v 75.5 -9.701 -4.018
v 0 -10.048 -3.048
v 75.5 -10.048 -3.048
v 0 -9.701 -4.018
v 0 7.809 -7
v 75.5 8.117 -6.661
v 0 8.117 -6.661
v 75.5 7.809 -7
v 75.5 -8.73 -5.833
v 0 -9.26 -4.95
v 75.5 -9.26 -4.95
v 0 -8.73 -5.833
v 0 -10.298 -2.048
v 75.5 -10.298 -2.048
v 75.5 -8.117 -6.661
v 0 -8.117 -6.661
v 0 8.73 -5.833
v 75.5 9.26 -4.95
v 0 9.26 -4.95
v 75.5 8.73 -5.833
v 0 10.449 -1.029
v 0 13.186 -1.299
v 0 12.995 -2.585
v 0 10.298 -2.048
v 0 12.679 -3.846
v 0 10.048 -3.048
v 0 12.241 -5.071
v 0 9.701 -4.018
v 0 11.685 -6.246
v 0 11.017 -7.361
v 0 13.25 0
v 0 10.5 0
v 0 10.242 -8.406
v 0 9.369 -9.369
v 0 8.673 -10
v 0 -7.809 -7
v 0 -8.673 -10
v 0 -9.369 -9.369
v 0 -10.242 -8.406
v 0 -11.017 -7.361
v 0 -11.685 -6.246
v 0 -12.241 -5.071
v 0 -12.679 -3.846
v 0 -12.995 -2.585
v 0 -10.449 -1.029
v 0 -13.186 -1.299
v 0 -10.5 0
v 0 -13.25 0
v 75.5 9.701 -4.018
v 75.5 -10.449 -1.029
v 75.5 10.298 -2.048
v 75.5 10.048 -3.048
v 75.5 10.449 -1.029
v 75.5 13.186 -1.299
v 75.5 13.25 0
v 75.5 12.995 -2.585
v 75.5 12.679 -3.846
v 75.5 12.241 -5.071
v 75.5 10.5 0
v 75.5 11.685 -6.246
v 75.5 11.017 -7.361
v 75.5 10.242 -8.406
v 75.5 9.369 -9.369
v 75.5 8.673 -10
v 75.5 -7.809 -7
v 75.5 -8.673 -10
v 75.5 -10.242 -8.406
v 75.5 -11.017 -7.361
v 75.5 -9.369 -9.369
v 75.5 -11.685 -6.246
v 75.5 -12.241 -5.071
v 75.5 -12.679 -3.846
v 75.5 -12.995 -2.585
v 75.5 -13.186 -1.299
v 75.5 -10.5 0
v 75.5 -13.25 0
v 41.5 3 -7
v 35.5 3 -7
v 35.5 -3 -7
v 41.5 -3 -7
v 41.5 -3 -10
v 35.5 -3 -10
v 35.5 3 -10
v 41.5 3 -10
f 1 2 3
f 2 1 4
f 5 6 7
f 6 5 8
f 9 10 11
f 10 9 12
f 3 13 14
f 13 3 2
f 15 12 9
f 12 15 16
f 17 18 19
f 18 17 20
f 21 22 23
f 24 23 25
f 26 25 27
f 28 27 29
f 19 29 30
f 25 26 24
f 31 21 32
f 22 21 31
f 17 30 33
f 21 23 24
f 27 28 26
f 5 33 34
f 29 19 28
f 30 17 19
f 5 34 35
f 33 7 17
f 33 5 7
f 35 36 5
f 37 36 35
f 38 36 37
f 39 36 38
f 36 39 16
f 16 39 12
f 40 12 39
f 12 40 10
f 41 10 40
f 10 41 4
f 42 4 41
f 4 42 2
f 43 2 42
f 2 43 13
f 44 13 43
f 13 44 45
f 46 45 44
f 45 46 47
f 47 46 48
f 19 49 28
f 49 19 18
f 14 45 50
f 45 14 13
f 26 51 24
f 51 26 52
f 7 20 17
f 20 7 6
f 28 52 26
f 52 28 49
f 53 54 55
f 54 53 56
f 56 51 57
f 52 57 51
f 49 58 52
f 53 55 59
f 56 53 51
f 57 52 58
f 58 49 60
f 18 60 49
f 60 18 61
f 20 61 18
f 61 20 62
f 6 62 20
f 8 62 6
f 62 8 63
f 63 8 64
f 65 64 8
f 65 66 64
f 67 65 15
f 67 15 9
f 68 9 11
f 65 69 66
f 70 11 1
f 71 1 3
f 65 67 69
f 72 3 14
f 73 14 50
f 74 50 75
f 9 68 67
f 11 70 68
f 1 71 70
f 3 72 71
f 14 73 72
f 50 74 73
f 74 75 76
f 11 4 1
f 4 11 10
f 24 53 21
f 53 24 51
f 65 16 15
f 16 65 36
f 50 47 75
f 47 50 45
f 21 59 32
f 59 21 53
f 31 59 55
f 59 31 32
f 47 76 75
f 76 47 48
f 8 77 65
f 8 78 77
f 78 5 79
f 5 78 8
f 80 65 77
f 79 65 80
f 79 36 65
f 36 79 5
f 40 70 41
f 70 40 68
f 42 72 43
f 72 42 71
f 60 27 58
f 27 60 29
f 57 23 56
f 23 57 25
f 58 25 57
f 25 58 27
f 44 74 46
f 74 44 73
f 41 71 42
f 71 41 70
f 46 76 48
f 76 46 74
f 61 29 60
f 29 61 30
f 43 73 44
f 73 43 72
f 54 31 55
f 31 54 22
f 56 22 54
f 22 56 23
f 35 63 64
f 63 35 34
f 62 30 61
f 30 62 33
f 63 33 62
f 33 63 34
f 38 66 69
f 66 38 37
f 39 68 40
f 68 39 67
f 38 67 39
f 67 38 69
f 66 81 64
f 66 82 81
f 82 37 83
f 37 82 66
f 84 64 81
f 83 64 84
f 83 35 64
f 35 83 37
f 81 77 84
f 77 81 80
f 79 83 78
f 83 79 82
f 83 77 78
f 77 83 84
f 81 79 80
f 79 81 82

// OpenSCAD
$fn=64;

length=75.5;

rotate([0, 90, 0]) {
  difference() {
    cylinder(h=length, r=13.25);
    union() {
      cylinder(h=length, r=10.5);
      translate([-13.25, -13.25, 0]) cube([13.25, 26.5, length]);
      translate([7, -13.25, 0]) cube([6.5, 26.5, length]);
    }
  }

  difference() {
    translate([7, -12.5, 0]) cube([3, 25, length]);
    union() {
      difference() {
        cylinder(h=length, r=16.25);
        cylinder(h=length, r=13.25);
      }
      translate([7, -3, 35.5]) cube([3, 6, 6]);
    }
  }
}
